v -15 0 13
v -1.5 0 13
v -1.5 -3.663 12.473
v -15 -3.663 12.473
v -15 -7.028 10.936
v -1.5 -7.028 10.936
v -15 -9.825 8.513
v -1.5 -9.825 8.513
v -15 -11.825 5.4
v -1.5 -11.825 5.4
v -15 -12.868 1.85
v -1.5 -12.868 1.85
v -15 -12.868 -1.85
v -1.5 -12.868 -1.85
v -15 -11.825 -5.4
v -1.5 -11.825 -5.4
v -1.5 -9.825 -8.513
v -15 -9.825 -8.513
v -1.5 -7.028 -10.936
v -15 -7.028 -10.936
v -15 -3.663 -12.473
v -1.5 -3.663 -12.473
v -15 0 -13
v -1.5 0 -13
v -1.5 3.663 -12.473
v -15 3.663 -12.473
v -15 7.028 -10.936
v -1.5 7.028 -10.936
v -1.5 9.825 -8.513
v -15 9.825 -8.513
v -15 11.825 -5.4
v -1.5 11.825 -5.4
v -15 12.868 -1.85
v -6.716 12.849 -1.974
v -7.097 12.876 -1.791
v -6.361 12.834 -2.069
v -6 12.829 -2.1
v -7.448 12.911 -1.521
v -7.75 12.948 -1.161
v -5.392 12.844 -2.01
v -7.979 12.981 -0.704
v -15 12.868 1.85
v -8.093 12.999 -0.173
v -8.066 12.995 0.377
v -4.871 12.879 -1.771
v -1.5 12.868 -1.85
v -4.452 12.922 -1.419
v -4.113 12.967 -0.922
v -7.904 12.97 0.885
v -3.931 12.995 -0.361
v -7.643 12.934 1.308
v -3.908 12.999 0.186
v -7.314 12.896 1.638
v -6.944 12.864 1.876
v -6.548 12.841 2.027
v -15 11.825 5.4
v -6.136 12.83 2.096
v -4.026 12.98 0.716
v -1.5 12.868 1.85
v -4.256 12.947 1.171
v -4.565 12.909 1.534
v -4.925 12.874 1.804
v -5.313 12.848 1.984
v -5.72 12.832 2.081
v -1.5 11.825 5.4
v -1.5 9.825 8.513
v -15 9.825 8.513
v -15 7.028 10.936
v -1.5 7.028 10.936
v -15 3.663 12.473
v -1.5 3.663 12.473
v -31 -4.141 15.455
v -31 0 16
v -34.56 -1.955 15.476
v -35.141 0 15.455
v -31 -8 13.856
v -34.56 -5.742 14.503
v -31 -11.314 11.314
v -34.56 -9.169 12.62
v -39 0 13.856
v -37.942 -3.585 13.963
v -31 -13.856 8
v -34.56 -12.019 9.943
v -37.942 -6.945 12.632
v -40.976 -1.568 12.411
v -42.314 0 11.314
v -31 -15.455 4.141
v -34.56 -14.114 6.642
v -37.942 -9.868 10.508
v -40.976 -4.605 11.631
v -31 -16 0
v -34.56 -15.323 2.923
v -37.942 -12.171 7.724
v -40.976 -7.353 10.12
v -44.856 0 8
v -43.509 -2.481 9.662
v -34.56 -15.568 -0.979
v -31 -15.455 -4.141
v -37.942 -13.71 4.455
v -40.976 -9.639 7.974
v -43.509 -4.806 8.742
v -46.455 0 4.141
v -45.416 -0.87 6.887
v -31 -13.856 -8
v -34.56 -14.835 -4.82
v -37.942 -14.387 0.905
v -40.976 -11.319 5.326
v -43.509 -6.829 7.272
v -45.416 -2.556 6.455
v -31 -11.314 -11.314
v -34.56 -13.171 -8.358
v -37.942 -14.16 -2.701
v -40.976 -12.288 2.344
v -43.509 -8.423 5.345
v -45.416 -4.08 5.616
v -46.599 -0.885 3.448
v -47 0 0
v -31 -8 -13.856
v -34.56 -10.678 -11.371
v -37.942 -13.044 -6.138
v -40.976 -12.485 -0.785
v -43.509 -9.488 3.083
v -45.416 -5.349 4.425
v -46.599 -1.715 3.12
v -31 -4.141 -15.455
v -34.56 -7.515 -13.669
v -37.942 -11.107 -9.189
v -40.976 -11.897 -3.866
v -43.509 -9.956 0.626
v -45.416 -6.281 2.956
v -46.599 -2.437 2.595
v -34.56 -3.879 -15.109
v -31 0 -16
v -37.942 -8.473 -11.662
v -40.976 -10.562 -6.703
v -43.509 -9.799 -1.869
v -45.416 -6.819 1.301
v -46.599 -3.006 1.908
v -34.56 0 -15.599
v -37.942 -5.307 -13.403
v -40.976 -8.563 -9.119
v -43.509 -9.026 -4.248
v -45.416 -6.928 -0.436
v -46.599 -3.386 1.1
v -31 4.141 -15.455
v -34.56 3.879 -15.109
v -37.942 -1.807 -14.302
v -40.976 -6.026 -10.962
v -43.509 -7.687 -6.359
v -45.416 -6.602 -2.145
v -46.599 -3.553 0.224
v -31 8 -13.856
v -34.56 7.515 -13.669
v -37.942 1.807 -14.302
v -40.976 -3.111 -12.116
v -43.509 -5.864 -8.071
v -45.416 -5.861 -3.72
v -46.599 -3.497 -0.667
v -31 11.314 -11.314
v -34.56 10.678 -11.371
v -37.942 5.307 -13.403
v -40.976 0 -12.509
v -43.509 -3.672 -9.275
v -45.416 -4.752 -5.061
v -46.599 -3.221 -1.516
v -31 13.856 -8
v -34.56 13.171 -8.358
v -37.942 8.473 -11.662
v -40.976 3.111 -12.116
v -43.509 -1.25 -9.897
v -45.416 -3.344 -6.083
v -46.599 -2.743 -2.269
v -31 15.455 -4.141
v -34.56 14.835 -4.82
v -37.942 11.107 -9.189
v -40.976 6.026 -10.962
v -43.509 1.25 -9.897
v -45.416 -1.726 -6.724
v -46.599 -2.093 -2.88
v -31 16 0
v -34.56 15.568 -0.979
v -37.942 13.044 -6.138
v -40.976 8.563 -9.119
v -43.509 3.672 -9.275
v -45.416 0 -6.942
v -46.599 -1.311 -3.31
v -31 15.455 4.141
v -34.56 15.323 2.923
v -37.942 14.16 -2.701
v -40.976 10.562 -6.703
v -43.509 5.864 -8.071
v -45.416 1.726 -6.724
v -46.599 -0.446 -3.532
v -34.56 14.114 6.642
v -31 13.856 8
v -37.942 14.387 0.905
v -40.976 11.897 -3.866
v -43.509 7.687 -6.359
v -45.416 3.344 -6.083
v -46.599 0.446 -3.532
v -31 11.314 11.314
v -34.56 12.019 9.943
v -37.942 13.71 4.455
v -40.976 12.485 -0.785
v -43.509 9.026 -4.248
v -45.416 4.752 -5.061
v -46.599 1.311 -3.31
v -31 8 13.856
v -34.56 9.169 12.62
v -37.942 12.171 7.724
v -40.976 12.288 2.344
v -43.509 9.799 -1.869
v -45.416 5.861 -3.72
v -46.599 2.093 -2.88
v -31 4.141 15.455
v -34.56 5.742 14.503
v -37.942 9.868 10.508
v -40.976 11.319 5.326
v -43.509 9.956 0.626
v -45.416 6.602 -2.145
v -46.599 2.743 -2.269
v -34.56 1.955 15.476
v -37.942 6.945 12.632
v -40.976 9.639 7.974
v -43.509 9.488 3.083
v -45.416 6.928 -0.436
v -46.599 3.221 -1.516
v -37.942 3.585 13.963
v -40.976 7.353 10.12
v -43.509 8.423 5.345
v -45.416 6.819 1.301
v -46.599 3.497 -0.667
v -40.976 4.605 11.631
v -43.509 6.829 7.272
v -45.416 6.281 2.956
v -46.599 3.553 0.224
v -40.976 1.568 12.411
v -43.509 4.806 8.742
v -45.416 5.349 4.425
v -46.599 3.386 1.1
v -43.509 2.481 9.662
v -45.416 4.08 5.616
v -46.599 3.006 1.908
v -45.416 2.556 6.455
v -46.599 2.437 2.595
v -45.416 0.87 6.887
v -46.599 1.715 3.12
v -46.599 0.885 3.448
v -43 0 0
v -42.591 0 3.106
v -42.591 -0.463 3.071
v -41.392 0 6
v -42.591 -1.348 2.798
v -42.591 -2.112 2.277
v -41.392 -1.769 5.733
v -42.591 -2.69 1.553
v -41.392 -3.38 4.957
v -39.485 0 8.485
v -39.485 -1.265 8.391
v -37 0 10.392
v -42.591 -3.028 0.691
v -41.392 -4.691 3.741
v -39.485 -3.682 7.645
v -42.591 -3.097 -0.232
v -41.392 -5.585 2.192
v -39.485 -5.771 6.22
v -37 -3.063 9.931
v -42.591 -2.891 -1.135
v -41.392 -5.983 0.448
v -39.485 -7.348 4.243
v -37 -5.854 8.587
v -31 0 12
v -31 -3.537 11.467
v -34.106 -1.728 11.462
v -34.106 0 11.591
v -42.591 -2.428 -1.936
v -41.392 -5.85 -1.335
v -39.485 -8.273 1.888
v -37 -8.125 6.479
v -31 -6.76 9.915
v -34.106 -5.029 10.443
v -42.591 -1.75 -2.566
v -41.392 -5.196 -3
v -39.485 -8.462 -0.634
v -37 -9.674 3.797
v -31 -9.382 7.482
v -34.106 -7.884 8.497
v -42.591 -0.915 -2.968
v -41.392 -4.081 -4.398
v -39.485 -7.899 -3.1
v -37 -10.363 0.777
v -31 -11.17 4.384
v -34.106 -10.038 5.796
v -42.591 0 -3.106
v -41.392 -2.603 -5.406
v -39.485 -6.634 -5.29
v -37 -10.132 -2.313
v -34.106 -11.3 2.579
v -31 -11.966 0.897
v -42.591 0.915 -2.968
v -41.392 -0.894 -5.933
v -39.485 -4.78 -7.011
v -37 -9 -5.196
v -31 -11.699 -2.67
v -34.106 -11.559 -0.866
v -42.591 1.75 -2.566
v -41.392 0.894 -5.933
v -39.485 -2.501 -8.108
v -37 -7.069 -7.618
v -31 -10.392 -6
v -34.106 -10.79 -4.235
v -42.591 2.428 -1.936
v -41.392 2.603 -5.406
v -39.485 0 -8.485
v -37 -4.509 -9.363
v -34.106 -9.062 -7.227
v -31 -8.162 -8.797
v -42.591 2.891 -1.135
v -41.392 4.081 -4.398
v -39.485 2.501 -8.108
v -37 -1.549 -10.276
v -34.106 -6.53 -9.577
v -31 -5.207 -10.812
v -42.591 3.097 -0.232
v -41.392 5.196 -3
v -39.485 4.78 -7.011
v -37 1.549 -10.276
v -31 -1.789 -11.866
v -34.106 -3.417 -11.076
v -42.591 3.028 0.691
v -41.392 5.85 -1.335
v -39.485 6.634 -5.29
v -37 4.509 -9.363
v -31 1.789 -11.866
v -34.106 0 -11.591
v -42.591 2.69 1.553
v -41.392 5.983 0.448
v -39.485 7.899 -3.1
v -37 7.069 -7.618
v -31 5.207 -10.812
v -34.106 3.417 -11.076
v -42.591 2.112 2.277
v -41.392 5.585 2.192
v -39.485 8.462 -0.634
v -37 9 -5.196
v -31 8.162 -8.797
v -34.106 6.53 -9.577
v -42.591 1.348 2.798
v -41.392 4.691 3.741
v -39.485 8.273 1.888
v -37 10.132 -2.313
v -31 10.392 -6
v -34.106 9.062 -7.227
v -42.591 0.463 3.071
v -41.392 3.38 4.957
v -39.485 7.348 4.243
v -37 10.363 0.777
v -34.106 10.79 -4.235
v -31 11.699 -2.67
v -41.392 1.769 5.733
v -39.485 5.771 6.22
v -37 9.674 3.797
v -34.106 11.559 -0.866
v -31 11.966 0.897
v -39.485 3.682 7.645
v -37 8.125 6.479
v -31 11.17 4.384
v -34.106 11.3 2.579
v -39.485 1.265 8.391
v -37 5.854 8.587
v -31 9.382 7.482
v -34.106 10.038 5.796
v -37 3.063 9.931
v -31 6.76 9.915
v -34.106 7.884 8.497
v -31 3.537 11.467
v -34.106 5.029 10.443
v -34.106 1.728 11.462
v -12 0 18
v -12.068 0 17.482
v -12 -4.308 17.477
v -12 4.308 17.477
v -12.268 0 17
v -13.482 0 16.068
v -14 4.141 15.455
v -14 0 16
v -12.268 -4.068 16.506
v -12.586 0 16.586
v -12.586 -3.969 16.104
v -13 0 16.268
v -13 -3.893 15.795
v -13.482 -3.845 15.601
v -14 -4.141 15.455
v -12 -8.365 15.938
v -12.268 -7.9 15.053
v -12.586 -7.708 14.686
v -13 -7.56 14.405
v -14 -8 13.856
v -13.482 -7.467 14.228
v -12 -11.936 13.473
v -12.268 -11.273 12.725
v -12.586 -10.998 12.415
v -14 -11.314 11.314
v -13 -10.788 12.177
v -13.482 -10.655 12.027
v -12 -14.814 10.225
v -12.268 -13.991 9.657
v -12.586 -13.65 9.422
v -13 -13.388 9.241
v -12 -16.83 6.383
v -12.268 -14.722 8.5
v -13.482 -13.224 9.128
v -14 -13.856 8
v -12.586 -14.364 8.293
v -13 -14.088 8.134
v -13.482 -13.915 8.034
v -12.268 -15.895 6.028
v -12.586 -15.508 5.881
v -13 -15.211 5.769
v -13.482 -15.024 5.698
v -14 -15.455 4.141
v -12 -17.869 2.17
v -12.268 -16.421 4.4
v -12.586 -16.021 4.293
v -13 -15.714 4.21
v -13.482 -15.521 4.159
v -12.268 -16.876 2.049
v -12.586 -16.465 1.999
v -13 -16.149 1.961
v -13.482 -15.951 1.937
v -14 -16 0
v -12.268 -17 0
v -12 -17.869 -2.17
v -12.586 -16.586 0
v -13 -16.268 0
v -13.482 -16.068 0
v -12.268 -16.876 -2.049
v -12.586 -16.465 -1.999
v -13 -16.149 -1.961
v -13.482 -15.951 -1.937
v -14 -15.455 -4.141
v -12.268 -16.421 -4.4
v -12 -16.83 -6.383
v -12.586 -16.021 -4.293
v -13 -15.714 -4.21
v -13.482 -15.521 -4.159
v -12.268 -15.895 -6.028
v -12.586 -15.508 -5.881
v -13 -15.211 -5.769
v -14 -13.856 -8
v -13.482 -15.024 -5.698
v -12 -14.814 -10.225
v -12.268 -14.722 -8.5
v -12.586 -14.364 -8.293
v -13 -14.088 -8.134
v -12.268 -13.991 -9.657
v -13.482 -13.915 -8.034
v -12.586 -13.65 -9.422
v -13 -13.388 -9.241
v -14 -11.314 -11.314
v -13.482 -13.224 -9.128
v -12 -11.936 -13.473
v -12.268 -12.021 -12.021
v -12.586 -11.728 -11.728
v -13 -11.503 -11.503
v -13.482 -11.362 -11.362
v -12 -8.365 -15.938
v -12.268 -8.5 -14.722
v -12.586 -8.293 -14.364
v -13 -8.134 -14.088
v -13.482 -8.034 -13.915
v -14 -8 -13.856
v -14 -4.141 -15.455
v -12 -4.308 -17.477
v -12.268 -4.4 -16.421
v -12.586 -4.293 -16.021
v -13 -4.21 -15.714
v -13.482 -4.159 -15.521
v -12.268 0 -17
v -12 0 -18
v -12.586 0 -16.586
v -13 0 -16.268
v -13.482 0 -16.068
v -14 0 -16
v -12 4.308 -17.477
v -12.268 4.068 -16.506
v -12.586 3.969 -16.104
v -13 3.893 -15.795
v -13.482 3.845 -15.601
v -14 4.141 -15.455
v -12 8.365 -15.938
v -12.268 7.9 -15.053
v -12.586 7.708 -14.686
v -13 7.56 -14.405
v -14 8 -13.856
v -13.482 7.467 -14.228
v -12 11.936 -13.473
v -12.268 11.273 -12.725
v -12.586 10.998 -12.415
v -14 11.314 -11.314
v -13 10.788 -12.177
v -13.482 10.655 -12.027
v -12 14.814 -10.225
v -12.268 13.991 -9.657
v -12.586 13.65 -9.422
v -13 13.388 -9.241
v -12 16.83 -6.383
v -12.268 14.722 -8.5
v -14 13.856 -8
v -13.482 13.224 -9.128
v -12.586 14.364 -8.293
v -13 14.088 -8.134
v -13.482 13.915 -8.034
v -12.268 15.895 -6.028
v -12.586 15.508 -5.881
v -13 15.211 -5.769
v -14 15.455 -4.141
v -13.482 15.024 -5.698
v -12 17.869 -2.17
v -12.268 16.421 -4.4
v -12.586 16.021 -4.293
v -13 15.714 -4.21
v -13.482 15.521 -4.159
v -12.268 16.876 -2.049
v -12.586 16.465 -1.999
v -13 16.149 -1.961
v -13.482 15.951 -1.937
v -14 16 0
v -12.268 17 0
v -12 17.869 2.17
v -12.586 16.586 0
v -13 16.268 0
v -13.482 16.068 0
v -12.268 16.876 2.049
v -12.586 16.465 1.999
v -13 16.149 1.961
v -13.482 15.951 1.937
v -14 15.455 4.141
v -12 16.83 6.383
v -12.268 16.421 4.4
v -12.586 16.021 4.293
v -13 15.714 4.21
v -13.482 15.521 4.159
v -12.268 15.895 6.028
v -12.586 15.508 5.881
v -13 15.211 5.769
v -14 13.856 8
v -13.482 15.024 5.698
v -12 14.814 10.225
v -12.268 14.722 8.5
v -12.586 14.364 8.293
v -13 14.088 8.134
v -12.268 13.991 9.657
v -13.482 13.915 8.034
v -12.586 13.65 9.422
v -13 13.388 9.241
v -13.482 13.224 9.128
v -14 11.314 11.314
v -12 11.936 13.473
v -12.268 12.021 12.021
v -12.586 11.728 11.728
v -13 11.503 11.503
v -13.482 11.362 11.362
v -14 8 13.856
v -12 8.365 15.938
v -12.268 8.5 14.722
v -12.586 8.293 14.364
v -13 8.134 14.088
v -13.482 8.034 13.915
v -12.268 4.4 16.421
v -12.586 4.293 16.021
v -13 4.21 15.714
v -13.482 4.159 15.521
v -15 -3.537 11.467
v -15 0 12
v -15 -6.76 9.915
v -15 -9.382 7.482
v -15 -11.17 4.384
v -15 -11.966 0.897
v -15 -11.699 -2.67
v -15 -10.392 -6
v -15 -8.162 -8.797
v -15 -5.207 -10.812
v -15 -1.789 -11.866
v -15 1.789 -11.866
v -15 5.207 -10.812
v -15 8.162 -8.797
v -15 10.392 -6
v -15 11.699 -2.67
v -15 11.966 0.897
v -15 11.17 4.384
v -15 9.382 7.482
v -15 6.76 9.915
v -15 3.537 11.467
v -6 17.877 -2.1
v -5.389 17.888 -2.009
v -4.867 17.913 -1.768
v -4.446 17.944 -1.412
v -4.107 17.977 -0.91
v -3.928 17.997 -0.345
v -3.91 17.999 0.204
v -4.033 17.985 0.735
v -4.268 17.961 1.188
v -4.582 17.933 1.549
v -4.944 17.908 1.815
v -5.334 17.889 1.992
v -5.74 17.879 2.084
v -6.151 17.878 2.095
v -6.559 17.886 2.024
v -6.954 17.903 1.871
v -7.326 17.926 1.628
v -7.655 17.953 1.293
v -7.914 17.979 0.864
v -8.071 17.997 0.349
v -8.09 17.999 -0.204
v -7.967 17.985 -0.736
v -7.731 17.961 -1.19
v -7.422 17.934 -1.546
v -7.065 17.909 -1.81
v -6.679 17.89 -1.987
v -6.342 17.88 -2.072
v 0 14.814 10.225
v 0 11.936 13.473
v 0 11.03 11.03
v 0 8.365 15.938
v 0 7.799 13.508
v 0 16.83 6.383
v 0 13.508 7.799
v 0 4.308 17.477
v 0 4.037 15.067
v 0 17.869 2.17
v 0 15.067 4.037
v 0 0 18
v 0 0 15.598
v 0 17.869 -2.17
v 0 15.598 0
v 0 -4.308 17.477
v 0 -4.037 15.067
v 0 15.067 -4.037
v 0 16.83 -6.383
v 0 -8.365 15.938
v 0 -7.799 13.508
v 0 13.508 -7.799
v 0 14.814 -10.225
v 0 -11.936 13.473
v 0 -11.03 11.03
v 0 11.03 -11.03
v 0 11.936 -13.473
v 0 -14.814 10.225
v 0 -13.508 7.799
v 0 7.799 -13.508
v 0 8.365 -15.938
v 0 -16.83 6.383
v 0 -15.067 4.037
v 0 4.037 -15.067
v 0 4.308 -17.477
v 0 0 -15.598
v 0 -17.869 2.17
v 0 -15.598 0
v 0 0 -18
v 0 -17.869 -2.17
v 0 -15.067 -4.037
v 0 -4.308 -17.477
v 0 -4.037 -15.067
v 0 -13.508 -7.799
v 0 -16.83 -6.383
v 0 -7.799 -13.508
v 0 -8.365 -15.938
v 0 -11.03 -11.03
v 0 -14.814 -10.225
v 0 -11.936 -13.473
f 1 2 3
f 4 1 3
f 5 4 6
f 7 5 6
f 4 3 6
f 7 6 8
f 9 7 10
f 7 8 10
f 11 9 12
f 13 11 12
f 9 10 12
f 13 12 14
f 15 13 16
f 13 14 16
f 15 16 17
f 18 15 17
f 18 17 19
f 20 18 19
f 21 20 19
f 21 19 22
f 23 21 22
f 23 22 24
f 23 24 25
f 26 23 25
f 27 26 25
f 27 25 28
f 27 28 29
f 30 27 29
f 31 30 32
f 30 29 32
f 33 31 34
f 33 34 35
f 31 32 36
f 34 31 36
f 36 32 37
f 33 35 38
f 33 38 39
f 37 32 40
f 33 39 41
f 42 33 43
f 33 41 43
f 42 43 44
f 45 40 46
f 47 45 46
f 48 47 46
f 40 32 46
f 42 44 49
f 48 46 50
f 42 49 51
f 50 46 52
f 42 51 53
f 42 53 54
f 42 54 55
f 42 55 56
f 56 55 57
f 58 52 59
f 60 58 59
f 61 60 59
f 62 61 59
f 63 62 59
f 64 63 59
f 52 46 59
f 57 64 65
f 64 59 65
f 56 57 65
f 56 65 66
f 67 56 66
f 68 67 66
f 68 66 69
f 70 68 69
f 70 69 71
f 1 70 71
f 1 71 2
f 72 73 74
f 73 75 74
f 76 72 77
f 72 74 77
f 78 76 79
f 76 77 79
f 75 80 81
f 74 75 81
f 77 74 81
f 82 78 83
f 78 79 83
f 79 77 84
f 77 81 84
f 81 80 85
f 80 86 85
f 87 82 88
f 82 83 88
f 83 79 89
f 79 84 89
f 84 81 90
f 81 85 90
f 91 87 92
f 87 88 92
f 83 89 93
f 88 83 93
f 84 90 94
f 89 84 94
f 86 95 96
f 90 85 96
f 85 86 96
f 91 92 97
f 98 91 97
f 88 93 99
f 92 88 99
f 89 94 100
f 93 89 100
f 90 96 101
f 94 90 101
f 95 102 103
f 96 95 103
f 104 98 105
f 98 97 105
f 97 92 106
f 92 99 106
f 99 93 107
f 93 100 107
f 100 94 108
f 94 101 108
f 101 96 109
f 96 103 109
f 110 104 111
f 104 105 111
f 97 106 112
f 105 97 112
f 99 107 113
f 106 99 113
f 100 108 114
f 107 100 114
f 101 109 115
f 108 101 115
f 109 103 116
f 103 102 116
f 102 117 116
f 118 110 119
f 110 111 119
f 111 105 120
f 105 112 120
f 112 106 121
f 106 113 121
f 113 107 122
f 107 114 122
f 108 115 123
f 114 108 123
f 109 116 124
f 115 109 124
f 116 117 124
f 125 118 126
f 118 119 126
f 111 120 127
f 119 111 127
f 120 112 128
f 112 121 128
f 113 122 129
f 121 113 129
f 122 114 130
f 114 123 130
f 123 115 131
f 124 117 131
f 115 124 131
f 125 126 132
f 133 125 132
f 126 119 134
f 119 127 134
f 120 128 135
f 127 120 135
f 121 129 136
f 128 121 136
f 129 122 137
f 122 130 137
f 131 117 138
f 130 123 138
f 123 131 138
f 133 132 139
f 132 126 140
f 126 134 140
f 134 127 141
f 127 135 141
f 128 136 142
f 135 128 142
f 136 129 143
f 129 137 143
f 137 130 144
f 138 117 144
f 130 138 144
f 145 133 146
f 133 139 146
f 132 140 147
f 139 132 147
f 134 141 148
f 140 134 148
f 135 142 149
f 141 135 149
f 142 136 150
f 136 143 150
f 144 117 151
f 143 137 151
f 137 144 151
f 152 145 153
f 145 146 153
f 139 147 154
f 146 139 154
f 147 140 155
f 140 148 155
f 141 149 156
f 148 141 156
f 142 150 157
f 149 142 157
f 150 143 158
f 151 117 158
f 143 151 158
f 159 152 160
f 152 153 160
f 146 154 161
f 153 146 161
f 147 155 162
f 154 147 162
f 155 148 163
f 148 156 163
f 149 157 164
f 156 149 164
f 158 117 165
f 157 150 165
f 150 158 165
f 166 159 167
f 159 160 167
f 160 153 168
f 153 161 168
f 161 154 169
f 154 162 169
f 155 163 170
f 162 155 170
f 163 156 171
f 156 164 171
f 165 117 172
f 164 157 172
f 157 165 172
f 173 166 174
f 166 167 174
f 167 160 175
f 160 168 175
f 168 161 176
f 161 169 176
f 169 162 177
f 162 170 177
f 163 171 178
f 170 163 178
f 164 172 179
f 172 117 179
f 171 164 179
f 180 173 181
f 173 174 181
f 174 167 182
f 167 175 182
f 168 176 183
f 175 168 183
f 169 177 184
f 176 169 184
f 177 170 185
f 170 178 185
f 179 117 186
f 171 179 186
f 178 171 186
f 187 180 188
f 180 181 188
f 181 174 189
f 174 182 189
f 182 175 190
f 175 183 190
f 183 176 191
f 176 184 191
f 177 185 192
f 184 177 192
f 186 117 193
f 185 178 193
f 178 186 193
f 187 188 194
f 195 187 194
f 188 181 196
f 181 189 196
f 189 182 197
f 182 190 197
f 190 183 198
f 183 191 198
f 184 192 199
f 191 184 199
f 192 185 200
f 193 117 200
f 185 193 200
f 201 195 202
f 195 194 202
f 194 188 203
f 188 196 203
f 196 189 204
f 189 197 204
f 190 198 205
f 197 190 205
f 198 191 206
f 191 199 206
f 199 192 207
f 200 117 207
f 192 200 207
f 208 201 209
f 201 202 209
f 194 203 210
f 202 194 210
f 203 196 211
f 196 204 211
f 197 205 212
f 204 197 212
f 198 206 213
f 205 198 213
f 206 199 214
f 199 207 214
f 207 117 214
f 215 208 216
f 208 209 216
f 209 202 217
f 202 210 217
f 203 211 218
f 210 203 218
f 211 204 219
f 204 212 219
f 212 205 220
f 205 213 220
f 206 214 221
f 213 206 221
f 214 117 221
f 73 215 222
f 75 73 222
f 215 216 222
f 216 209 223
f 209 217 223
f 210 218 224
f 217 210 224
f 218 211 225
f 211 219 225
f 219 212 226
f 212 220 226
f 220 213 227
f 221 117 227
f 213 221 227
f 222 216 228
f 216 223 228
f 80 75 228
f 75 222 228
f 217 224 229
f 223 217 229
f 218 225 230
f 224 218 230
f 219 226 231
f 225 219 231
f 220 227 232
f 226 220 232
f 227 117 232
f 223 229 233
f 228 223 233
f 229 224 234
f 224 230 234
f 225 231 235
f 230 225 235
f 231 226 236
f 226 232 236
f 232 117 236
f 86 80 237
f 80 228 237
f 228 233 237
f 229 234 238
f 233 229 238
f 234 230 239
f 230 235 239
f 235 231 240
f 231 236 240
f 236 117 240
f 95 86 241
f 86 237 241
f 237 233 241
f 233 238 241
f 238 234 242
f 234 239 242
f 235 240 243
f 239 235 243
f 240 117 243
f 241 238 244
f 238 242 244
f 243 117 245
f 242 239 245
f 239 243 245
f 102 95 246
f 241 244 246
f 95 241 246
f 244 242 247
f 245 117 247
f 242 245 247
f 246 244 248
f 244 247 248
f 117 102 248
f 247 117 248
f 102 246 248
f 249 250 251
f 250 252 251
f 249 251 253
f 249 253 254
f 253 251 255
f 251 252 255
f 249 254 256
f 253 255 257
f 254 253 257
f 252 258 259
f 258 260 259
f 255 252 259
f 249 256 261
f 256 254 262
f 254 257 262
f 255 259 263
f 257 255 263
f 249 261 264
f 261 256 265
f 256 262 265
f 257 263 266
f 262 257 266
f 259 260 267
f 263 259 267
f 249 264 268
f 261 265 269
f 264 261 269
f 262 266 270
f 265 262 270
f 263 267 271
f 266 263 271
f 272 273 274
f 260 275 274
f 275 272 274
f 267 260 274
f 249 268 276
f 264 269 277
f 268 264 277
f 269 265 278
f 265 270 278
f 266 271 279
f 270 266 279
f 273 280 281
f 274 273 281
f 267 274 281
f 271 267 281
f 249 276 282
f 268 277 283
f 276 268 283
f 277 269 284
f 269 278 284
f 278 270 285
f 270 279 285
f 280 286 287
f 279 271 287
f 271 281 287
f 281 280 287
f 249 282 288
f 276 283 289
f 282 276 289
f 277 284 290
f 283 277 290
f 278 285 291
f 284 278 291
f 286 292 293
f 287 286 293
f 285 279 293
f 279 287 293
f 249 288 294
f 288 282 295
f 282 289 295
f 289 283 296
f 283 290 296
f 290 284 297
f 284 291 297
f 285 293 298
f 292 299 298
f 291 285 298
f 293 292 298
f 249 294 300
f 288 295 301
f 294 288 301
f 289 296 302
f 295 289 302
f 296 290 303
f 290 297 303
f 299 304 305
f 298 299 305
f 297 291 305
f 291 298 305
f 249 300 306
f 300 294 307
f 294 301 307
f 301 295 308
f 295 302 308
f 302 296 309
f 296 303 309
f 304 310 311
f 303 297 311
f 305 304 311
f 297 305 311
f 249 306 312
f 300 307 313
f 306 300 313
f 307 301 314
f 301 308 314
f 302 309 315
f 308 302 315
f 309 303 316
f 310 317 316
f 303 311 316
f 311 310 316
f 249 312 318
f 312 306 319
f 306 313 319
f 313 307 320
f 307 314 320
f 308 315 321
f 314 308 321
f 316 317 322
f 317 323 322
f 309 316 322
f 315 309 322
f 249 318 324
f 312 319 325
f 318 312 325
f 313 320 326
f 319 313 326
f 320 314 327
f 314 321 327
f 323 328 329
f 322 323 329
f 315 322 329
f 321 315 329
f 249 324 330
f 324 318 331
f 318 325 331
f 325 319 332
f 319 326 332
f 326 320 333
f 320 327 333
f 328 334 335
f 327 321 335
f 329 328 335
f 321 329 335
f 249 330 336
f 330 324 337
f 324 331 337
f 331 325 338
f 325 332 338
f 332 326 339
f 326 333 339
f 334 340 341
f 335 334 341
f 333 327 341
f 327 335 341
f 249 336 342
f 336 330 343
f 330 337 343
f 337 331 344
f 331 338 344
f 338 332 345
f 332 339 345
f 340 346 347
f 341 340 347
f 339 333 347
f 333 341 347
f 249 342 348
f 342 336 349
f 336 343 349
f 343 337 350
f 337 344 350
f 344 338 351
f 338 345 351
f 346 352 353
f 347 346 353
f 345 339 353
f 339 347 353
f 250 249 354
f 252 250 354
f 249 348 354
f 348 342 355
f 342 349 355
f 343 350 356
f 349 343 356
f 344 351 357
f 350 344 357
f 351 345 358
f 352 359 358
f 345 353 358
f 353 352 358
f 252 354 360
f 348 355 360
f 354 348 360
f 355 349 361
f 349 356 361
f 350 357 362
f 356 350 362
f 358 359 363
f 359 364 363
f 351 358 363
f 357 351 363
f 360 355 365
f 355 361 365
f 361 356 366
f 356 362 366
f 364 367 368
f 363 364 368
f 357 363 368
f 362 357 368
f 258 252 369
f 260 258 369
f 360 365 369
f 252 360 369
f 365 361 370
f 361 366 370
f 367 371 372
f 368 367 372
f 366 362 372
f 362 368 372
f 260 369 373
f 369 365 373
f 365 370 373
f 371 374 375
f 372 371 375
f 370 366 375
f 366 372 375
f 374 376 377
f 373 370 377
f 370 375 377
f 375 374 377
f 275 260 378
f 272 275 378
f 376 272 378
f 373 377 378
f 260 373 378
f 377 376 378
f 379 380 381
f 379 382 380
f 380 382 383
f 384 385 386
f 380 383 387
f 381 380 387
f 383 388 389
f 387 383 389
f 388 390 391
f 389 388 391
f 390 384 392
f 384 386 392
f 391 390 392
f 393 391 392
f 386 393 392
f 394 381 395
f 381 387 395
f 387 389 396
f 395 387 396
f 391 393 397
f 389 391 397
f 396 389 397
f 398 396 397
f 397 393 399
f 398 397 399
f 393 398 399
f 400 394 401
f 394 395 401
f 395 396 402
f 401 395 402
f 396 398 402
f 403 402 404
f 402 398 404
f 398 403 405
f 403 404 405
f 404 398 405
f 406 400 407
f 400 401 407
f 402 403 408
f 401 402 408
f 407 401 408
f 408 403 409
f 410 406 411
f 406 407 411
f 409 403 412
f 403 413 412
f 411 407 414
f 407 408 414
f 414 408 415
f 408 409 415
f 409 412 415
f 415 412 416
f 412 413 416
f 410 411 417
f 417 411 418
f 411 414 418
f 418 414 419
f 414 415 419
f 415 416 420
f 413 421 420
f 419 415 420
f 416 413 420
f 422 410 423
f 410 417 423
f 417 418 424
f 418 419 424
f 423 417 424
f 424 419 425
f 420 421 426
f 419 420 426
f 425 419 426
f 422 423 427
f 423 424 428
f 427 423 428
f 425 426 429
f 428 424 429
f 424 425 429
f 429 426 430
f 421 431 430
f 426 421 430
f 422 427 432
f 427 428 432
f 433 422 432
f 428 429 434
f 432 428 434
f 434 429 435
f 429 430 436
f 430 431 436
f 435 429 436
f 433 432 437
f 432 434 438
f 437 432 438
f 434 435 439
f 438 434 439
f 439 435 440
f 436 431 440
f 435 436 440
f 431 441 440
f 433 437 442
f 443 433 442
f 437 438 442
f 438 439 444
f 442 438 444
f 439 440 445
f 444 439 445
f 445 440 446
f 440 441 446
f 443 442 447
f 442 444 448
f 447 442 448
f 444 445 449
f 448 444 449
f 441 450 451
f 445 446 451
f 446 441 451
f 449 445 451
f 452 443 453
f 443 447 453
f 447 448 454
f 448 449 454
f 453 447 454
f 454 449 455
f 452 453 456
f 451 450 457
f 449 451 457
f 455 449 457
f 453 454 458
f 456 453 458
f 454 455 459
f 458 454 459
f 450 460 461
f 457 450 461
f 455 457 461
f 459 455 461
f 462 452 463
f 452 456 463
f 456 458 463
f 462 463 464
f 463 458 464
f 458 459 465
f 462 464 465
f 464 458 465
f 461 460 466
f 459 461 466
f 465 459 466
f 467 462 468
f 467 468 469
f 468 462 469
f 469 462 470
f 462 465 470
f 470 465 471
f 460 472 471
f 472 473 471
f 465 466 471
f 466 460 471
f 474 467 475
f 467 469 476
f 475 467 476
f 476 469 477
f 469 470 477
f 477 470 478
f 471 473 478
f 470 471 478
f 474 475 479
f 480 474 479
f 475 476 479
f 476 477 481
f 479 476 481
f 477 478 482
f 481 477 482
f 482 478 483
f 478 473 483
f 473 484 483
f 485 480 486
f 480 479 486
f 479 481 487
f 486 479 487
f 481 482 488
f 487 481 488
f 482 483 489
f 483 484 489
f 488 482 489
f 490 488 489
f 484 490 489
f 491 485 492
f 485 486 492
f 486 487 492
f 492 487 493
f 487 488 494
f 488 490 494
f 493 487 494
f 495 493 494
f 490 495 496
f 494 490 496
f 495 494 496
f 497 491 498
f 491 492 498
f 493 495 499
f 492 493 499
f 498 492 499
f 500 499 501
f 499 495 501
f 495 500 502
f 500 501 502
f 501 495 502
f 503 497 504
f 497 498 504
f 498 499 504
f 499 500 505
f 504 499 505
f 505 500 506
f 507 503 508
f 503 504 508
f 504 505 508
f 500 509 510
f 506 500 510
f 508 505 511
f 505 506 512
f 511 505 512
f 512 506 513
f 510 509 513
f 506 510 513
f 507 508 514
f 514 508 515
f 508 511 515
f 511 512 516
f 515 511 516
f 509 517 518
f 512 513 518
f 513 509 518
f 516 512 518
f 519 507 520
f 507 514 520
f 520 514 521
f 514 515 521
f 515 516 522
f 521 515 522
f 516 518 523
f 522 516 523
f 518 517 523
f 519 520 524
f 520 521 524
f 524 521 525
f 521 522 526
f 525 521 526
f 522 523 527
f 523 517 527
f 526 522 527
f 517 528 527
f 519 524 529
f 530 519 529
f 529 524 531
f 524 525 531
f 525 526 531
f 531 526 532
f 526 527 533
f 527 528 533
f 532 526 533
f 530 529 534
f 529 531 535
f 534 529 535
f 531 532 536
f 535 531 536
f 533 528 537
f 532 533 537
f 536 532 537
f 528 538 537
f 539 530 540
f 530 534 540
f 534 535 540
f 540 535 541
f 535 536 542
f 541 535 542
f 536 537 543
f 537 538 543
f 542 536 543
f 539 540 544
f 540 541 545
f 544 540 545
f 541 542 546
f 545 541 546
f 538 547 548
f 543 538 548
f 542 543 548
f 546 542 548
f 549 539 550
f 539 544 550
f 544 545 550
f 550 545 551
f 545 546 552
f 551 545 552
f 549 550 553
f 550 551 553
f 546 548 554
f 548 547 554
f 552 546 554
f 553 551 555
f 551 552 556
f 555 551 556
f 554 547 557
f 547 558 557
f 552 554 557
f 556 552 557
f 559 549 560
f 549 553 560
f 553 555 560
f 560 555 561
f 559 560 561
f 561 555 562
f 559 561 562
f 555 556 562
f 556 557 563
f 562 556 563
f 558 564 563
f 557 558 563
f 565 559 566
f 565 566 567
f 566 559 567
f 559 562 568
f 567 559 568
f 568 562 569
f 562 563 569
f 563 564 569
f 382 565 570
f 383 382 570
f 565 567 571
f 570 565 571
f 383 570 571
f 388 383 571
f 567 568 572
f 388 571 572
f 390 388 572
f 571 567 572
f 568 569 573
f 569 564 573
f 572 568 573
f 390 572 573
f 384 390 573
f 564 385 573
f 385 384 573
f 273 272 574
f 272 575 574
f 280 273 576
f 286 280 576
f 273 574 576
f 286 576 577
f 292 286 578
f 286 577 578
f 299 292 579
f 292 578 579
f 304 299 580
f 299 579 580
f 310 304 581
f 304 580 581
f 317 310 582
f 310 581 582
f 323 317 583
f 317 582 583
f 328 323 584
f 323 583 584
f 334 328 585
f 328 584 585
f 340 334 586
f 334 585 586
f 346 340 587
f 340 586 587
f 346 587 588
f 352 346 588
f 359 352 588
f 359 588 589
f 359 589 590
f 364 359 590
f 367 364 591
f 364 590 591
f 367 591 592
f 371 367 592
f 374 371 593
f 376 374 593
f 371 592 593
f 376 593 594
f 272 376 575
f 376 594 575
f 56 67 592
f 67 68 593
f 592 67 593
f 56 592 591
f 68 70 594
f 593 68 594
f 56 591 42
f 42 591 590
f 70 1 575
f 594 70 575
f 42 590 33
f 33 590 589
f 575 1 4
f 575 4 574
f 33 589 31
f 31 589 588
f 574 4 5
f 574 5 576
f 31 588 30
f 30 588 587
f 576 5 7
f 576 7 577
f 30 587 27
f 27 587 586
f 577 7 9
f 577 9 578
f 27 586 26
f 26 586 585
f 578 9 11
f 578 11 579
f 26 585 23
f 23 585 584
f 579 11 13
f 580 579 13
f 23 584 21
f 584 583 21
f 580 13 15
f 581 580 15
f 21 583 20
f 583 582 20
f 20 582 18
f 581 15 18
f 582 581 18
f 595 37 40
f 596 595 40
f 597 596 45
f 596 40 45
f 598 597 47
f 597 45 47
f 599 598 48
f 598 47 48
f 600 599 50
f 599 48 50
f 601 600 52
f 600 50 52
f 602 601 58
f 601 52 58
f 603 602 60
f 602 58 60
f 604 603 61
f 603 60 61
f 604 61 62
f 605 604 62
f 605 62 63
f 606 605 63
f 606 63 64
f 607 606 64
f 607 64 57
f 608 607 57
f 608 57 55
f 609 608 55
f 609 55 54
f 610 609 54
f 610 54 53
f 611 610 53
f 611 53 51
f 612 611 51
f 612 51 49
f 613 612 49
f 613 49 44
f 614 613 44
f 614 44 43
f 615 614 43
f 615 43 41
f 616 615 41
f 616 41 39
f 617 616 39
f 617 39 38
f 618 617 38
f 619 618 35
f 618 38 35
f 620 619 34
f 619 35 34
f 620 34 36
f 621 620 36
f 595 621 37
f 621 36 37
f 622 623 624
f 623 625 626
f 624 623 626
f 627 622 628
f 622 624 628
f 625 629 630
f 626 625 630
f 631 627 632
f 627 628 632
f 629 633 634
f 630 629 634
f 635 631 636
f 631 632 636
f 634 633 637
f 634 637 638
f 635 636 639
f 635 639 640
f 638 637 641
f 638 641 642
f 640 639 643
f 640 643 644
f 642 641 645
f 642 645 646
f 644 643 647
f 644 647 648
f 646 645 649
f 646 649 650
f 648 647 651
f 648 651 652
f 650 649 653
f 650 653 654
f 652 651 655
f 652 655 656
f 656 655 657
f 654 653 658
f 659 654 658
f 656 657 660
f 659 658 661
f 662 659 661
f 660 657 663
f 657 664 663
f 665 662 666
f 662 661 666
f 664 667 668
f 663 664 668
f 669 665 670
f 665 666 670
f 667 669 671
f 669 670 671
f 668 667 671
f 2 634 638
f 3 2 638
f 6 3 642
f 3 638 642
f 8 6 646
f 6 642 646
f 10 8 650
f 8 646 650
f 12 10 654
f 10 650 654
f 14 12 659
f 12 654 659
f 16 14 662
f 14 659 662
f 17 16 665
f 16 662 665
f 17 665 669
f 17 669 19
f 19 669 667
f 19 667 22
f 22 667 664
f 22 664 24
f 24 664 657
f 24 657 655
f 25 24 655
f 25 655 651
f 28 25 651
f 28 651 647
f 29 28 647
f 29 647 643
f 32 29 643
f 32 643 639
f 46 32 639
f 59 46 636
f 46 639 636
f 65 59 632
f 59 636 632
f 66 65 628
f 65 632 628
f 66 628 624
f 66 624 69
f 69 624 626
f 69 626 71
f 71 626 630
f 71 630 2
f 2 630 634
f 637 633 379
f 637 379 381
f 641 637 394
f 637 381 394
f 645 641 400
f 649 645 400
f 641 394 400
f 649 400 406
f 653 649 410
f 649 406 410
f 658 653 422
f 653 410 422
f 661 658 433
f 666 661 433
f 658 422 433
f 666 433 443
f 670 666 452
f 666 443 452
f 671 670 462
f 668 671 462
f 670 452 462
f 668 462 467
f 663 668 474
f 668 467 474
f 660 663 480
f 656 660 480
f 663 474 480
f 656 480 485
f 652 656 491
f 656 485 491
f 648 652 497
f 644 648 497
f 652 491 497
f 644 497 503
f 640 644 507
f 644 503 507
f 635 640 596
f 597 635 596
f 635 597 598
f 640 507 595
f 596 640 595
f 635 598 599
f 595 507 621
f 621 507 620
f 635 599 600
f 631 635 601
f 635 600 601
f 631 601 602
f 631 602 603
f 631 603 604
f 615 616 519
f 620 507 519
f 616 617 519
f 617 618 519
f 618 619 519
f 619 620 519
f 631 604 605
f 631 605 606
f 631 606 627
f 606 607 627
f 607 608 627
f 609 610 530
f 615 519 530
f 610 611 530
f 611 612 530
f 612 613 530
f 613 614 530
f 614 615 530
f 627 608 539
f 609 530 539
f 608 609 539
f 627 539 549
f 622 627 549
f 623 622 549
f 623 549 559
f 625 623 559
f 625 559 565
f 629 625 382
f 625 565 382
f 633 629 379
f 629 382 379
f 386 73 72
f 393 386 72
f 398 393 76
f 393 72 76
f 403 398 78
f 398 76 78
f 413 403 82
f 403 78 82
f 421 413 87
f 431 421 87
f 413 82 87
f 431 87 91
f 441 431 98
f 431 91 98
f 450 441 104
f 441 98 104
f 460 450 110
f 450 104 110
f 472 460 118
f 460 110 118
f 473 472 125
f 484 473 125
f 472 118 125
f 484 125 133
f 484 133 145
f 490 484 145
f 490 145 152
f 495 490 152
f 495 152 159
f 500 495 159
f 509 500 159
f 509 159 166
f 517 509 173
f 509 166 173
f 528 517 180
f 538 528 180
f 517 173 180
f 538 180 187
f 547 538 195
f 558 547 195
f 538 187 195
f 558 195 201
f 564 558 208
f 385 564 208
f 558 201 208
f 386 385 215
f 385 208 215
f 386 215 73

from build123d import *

# Parameters (mm, degrees)
FILLET_1_R             = 2
CHAMFER_1_SIZE         = 1.5
CHAMFER_1_SIZE2        = 2.598076211
HOLE_WIZARD_M5_1_D     = 4.2
HOLE_WIZARD_M5_1_DEPTH = 12.4
HOLE_WIZARD_M5_1_TIP   = 1.2618073


with BuildPart() as part:
    # 草图1 → 旋转1 (revolve)
    with BuildSketch(Plane.XY, mode=Mode.PRIVATE) as revolve_1_sk:
        with BuildLine():
            Line((0, 13), (0, 18))
            Line((0, 18), (-12, 18))
            Line((-12, 18), (-12, 16))
            Line((-12, 16), (-31, 16))
            ThreePointArc((-31, 16), (-42.313708499, 11.313708499), (-47, 0))
            Line((-47, 0), (-43, 0))
            ThreePointArc((-43, 0), (-39.485281374, 8.485281374), (-31, 12))
            Line((-31, 12), (-15, 12))
            Line((-15, 12), (-15, 13))
            Line((-15, 13), (0, 13))
        make_face()
    revolve(revolve_1_sk.sketch.rotate(Axis((-47, 0, 0), (1, 0, 0)), 90), axis=Axis((-47, 0, 0), (1, 0, 0)))

    # 圆角1
    fillet_1_edges = [part.edges().sort_by_distance(p)[0] for p in [
        (-12, 0, -16),
    ]]
    fillet(fillet_1_edges, radius=FILLET_1_R - 0.0001)  # a hair under: the kernel refuses the full size

    # 倒角1
    chamfer_1_edges = [part.edges().sort_by_distance(p)[0] for p in [
        (0, 0, -13),
    ]]
    chamfer_1_side = [part.faces().sort_by_distance(p)[0] for p in [
        (-7.5, 0, -13),
    ]]
    chamfer(chamfer_1_edges, length=CHAMFER_1_SIZE, length2=CHAMFER_1_SIZE2, reference=chamfer_1_side[0])

    # M5 螺纹孔1
    with Locations(Plane(origin=(-6, 18, 0), x_dir=(0, 0, 1), z_dir=(0, 1, 0))):
        with Locations((0, 0)):
            Hole(HOLE_WIZARD_M5_1_D / 2, depth=HOLE_WIZARD_M5_1_DEPTH)
            with Locations((0, 0, -(HOLE_WIZARD_M5_1_DEPTH + HOLE_WIZARD_M5_1_TIP / 2))):  # 118° drill point
                Cone(0, HOLE_WIZARD_M5_1_D / 2, HOLE_WIZARD_M5_1_TIP, mode=Mode.SUBTRACT)


solid = part.part
